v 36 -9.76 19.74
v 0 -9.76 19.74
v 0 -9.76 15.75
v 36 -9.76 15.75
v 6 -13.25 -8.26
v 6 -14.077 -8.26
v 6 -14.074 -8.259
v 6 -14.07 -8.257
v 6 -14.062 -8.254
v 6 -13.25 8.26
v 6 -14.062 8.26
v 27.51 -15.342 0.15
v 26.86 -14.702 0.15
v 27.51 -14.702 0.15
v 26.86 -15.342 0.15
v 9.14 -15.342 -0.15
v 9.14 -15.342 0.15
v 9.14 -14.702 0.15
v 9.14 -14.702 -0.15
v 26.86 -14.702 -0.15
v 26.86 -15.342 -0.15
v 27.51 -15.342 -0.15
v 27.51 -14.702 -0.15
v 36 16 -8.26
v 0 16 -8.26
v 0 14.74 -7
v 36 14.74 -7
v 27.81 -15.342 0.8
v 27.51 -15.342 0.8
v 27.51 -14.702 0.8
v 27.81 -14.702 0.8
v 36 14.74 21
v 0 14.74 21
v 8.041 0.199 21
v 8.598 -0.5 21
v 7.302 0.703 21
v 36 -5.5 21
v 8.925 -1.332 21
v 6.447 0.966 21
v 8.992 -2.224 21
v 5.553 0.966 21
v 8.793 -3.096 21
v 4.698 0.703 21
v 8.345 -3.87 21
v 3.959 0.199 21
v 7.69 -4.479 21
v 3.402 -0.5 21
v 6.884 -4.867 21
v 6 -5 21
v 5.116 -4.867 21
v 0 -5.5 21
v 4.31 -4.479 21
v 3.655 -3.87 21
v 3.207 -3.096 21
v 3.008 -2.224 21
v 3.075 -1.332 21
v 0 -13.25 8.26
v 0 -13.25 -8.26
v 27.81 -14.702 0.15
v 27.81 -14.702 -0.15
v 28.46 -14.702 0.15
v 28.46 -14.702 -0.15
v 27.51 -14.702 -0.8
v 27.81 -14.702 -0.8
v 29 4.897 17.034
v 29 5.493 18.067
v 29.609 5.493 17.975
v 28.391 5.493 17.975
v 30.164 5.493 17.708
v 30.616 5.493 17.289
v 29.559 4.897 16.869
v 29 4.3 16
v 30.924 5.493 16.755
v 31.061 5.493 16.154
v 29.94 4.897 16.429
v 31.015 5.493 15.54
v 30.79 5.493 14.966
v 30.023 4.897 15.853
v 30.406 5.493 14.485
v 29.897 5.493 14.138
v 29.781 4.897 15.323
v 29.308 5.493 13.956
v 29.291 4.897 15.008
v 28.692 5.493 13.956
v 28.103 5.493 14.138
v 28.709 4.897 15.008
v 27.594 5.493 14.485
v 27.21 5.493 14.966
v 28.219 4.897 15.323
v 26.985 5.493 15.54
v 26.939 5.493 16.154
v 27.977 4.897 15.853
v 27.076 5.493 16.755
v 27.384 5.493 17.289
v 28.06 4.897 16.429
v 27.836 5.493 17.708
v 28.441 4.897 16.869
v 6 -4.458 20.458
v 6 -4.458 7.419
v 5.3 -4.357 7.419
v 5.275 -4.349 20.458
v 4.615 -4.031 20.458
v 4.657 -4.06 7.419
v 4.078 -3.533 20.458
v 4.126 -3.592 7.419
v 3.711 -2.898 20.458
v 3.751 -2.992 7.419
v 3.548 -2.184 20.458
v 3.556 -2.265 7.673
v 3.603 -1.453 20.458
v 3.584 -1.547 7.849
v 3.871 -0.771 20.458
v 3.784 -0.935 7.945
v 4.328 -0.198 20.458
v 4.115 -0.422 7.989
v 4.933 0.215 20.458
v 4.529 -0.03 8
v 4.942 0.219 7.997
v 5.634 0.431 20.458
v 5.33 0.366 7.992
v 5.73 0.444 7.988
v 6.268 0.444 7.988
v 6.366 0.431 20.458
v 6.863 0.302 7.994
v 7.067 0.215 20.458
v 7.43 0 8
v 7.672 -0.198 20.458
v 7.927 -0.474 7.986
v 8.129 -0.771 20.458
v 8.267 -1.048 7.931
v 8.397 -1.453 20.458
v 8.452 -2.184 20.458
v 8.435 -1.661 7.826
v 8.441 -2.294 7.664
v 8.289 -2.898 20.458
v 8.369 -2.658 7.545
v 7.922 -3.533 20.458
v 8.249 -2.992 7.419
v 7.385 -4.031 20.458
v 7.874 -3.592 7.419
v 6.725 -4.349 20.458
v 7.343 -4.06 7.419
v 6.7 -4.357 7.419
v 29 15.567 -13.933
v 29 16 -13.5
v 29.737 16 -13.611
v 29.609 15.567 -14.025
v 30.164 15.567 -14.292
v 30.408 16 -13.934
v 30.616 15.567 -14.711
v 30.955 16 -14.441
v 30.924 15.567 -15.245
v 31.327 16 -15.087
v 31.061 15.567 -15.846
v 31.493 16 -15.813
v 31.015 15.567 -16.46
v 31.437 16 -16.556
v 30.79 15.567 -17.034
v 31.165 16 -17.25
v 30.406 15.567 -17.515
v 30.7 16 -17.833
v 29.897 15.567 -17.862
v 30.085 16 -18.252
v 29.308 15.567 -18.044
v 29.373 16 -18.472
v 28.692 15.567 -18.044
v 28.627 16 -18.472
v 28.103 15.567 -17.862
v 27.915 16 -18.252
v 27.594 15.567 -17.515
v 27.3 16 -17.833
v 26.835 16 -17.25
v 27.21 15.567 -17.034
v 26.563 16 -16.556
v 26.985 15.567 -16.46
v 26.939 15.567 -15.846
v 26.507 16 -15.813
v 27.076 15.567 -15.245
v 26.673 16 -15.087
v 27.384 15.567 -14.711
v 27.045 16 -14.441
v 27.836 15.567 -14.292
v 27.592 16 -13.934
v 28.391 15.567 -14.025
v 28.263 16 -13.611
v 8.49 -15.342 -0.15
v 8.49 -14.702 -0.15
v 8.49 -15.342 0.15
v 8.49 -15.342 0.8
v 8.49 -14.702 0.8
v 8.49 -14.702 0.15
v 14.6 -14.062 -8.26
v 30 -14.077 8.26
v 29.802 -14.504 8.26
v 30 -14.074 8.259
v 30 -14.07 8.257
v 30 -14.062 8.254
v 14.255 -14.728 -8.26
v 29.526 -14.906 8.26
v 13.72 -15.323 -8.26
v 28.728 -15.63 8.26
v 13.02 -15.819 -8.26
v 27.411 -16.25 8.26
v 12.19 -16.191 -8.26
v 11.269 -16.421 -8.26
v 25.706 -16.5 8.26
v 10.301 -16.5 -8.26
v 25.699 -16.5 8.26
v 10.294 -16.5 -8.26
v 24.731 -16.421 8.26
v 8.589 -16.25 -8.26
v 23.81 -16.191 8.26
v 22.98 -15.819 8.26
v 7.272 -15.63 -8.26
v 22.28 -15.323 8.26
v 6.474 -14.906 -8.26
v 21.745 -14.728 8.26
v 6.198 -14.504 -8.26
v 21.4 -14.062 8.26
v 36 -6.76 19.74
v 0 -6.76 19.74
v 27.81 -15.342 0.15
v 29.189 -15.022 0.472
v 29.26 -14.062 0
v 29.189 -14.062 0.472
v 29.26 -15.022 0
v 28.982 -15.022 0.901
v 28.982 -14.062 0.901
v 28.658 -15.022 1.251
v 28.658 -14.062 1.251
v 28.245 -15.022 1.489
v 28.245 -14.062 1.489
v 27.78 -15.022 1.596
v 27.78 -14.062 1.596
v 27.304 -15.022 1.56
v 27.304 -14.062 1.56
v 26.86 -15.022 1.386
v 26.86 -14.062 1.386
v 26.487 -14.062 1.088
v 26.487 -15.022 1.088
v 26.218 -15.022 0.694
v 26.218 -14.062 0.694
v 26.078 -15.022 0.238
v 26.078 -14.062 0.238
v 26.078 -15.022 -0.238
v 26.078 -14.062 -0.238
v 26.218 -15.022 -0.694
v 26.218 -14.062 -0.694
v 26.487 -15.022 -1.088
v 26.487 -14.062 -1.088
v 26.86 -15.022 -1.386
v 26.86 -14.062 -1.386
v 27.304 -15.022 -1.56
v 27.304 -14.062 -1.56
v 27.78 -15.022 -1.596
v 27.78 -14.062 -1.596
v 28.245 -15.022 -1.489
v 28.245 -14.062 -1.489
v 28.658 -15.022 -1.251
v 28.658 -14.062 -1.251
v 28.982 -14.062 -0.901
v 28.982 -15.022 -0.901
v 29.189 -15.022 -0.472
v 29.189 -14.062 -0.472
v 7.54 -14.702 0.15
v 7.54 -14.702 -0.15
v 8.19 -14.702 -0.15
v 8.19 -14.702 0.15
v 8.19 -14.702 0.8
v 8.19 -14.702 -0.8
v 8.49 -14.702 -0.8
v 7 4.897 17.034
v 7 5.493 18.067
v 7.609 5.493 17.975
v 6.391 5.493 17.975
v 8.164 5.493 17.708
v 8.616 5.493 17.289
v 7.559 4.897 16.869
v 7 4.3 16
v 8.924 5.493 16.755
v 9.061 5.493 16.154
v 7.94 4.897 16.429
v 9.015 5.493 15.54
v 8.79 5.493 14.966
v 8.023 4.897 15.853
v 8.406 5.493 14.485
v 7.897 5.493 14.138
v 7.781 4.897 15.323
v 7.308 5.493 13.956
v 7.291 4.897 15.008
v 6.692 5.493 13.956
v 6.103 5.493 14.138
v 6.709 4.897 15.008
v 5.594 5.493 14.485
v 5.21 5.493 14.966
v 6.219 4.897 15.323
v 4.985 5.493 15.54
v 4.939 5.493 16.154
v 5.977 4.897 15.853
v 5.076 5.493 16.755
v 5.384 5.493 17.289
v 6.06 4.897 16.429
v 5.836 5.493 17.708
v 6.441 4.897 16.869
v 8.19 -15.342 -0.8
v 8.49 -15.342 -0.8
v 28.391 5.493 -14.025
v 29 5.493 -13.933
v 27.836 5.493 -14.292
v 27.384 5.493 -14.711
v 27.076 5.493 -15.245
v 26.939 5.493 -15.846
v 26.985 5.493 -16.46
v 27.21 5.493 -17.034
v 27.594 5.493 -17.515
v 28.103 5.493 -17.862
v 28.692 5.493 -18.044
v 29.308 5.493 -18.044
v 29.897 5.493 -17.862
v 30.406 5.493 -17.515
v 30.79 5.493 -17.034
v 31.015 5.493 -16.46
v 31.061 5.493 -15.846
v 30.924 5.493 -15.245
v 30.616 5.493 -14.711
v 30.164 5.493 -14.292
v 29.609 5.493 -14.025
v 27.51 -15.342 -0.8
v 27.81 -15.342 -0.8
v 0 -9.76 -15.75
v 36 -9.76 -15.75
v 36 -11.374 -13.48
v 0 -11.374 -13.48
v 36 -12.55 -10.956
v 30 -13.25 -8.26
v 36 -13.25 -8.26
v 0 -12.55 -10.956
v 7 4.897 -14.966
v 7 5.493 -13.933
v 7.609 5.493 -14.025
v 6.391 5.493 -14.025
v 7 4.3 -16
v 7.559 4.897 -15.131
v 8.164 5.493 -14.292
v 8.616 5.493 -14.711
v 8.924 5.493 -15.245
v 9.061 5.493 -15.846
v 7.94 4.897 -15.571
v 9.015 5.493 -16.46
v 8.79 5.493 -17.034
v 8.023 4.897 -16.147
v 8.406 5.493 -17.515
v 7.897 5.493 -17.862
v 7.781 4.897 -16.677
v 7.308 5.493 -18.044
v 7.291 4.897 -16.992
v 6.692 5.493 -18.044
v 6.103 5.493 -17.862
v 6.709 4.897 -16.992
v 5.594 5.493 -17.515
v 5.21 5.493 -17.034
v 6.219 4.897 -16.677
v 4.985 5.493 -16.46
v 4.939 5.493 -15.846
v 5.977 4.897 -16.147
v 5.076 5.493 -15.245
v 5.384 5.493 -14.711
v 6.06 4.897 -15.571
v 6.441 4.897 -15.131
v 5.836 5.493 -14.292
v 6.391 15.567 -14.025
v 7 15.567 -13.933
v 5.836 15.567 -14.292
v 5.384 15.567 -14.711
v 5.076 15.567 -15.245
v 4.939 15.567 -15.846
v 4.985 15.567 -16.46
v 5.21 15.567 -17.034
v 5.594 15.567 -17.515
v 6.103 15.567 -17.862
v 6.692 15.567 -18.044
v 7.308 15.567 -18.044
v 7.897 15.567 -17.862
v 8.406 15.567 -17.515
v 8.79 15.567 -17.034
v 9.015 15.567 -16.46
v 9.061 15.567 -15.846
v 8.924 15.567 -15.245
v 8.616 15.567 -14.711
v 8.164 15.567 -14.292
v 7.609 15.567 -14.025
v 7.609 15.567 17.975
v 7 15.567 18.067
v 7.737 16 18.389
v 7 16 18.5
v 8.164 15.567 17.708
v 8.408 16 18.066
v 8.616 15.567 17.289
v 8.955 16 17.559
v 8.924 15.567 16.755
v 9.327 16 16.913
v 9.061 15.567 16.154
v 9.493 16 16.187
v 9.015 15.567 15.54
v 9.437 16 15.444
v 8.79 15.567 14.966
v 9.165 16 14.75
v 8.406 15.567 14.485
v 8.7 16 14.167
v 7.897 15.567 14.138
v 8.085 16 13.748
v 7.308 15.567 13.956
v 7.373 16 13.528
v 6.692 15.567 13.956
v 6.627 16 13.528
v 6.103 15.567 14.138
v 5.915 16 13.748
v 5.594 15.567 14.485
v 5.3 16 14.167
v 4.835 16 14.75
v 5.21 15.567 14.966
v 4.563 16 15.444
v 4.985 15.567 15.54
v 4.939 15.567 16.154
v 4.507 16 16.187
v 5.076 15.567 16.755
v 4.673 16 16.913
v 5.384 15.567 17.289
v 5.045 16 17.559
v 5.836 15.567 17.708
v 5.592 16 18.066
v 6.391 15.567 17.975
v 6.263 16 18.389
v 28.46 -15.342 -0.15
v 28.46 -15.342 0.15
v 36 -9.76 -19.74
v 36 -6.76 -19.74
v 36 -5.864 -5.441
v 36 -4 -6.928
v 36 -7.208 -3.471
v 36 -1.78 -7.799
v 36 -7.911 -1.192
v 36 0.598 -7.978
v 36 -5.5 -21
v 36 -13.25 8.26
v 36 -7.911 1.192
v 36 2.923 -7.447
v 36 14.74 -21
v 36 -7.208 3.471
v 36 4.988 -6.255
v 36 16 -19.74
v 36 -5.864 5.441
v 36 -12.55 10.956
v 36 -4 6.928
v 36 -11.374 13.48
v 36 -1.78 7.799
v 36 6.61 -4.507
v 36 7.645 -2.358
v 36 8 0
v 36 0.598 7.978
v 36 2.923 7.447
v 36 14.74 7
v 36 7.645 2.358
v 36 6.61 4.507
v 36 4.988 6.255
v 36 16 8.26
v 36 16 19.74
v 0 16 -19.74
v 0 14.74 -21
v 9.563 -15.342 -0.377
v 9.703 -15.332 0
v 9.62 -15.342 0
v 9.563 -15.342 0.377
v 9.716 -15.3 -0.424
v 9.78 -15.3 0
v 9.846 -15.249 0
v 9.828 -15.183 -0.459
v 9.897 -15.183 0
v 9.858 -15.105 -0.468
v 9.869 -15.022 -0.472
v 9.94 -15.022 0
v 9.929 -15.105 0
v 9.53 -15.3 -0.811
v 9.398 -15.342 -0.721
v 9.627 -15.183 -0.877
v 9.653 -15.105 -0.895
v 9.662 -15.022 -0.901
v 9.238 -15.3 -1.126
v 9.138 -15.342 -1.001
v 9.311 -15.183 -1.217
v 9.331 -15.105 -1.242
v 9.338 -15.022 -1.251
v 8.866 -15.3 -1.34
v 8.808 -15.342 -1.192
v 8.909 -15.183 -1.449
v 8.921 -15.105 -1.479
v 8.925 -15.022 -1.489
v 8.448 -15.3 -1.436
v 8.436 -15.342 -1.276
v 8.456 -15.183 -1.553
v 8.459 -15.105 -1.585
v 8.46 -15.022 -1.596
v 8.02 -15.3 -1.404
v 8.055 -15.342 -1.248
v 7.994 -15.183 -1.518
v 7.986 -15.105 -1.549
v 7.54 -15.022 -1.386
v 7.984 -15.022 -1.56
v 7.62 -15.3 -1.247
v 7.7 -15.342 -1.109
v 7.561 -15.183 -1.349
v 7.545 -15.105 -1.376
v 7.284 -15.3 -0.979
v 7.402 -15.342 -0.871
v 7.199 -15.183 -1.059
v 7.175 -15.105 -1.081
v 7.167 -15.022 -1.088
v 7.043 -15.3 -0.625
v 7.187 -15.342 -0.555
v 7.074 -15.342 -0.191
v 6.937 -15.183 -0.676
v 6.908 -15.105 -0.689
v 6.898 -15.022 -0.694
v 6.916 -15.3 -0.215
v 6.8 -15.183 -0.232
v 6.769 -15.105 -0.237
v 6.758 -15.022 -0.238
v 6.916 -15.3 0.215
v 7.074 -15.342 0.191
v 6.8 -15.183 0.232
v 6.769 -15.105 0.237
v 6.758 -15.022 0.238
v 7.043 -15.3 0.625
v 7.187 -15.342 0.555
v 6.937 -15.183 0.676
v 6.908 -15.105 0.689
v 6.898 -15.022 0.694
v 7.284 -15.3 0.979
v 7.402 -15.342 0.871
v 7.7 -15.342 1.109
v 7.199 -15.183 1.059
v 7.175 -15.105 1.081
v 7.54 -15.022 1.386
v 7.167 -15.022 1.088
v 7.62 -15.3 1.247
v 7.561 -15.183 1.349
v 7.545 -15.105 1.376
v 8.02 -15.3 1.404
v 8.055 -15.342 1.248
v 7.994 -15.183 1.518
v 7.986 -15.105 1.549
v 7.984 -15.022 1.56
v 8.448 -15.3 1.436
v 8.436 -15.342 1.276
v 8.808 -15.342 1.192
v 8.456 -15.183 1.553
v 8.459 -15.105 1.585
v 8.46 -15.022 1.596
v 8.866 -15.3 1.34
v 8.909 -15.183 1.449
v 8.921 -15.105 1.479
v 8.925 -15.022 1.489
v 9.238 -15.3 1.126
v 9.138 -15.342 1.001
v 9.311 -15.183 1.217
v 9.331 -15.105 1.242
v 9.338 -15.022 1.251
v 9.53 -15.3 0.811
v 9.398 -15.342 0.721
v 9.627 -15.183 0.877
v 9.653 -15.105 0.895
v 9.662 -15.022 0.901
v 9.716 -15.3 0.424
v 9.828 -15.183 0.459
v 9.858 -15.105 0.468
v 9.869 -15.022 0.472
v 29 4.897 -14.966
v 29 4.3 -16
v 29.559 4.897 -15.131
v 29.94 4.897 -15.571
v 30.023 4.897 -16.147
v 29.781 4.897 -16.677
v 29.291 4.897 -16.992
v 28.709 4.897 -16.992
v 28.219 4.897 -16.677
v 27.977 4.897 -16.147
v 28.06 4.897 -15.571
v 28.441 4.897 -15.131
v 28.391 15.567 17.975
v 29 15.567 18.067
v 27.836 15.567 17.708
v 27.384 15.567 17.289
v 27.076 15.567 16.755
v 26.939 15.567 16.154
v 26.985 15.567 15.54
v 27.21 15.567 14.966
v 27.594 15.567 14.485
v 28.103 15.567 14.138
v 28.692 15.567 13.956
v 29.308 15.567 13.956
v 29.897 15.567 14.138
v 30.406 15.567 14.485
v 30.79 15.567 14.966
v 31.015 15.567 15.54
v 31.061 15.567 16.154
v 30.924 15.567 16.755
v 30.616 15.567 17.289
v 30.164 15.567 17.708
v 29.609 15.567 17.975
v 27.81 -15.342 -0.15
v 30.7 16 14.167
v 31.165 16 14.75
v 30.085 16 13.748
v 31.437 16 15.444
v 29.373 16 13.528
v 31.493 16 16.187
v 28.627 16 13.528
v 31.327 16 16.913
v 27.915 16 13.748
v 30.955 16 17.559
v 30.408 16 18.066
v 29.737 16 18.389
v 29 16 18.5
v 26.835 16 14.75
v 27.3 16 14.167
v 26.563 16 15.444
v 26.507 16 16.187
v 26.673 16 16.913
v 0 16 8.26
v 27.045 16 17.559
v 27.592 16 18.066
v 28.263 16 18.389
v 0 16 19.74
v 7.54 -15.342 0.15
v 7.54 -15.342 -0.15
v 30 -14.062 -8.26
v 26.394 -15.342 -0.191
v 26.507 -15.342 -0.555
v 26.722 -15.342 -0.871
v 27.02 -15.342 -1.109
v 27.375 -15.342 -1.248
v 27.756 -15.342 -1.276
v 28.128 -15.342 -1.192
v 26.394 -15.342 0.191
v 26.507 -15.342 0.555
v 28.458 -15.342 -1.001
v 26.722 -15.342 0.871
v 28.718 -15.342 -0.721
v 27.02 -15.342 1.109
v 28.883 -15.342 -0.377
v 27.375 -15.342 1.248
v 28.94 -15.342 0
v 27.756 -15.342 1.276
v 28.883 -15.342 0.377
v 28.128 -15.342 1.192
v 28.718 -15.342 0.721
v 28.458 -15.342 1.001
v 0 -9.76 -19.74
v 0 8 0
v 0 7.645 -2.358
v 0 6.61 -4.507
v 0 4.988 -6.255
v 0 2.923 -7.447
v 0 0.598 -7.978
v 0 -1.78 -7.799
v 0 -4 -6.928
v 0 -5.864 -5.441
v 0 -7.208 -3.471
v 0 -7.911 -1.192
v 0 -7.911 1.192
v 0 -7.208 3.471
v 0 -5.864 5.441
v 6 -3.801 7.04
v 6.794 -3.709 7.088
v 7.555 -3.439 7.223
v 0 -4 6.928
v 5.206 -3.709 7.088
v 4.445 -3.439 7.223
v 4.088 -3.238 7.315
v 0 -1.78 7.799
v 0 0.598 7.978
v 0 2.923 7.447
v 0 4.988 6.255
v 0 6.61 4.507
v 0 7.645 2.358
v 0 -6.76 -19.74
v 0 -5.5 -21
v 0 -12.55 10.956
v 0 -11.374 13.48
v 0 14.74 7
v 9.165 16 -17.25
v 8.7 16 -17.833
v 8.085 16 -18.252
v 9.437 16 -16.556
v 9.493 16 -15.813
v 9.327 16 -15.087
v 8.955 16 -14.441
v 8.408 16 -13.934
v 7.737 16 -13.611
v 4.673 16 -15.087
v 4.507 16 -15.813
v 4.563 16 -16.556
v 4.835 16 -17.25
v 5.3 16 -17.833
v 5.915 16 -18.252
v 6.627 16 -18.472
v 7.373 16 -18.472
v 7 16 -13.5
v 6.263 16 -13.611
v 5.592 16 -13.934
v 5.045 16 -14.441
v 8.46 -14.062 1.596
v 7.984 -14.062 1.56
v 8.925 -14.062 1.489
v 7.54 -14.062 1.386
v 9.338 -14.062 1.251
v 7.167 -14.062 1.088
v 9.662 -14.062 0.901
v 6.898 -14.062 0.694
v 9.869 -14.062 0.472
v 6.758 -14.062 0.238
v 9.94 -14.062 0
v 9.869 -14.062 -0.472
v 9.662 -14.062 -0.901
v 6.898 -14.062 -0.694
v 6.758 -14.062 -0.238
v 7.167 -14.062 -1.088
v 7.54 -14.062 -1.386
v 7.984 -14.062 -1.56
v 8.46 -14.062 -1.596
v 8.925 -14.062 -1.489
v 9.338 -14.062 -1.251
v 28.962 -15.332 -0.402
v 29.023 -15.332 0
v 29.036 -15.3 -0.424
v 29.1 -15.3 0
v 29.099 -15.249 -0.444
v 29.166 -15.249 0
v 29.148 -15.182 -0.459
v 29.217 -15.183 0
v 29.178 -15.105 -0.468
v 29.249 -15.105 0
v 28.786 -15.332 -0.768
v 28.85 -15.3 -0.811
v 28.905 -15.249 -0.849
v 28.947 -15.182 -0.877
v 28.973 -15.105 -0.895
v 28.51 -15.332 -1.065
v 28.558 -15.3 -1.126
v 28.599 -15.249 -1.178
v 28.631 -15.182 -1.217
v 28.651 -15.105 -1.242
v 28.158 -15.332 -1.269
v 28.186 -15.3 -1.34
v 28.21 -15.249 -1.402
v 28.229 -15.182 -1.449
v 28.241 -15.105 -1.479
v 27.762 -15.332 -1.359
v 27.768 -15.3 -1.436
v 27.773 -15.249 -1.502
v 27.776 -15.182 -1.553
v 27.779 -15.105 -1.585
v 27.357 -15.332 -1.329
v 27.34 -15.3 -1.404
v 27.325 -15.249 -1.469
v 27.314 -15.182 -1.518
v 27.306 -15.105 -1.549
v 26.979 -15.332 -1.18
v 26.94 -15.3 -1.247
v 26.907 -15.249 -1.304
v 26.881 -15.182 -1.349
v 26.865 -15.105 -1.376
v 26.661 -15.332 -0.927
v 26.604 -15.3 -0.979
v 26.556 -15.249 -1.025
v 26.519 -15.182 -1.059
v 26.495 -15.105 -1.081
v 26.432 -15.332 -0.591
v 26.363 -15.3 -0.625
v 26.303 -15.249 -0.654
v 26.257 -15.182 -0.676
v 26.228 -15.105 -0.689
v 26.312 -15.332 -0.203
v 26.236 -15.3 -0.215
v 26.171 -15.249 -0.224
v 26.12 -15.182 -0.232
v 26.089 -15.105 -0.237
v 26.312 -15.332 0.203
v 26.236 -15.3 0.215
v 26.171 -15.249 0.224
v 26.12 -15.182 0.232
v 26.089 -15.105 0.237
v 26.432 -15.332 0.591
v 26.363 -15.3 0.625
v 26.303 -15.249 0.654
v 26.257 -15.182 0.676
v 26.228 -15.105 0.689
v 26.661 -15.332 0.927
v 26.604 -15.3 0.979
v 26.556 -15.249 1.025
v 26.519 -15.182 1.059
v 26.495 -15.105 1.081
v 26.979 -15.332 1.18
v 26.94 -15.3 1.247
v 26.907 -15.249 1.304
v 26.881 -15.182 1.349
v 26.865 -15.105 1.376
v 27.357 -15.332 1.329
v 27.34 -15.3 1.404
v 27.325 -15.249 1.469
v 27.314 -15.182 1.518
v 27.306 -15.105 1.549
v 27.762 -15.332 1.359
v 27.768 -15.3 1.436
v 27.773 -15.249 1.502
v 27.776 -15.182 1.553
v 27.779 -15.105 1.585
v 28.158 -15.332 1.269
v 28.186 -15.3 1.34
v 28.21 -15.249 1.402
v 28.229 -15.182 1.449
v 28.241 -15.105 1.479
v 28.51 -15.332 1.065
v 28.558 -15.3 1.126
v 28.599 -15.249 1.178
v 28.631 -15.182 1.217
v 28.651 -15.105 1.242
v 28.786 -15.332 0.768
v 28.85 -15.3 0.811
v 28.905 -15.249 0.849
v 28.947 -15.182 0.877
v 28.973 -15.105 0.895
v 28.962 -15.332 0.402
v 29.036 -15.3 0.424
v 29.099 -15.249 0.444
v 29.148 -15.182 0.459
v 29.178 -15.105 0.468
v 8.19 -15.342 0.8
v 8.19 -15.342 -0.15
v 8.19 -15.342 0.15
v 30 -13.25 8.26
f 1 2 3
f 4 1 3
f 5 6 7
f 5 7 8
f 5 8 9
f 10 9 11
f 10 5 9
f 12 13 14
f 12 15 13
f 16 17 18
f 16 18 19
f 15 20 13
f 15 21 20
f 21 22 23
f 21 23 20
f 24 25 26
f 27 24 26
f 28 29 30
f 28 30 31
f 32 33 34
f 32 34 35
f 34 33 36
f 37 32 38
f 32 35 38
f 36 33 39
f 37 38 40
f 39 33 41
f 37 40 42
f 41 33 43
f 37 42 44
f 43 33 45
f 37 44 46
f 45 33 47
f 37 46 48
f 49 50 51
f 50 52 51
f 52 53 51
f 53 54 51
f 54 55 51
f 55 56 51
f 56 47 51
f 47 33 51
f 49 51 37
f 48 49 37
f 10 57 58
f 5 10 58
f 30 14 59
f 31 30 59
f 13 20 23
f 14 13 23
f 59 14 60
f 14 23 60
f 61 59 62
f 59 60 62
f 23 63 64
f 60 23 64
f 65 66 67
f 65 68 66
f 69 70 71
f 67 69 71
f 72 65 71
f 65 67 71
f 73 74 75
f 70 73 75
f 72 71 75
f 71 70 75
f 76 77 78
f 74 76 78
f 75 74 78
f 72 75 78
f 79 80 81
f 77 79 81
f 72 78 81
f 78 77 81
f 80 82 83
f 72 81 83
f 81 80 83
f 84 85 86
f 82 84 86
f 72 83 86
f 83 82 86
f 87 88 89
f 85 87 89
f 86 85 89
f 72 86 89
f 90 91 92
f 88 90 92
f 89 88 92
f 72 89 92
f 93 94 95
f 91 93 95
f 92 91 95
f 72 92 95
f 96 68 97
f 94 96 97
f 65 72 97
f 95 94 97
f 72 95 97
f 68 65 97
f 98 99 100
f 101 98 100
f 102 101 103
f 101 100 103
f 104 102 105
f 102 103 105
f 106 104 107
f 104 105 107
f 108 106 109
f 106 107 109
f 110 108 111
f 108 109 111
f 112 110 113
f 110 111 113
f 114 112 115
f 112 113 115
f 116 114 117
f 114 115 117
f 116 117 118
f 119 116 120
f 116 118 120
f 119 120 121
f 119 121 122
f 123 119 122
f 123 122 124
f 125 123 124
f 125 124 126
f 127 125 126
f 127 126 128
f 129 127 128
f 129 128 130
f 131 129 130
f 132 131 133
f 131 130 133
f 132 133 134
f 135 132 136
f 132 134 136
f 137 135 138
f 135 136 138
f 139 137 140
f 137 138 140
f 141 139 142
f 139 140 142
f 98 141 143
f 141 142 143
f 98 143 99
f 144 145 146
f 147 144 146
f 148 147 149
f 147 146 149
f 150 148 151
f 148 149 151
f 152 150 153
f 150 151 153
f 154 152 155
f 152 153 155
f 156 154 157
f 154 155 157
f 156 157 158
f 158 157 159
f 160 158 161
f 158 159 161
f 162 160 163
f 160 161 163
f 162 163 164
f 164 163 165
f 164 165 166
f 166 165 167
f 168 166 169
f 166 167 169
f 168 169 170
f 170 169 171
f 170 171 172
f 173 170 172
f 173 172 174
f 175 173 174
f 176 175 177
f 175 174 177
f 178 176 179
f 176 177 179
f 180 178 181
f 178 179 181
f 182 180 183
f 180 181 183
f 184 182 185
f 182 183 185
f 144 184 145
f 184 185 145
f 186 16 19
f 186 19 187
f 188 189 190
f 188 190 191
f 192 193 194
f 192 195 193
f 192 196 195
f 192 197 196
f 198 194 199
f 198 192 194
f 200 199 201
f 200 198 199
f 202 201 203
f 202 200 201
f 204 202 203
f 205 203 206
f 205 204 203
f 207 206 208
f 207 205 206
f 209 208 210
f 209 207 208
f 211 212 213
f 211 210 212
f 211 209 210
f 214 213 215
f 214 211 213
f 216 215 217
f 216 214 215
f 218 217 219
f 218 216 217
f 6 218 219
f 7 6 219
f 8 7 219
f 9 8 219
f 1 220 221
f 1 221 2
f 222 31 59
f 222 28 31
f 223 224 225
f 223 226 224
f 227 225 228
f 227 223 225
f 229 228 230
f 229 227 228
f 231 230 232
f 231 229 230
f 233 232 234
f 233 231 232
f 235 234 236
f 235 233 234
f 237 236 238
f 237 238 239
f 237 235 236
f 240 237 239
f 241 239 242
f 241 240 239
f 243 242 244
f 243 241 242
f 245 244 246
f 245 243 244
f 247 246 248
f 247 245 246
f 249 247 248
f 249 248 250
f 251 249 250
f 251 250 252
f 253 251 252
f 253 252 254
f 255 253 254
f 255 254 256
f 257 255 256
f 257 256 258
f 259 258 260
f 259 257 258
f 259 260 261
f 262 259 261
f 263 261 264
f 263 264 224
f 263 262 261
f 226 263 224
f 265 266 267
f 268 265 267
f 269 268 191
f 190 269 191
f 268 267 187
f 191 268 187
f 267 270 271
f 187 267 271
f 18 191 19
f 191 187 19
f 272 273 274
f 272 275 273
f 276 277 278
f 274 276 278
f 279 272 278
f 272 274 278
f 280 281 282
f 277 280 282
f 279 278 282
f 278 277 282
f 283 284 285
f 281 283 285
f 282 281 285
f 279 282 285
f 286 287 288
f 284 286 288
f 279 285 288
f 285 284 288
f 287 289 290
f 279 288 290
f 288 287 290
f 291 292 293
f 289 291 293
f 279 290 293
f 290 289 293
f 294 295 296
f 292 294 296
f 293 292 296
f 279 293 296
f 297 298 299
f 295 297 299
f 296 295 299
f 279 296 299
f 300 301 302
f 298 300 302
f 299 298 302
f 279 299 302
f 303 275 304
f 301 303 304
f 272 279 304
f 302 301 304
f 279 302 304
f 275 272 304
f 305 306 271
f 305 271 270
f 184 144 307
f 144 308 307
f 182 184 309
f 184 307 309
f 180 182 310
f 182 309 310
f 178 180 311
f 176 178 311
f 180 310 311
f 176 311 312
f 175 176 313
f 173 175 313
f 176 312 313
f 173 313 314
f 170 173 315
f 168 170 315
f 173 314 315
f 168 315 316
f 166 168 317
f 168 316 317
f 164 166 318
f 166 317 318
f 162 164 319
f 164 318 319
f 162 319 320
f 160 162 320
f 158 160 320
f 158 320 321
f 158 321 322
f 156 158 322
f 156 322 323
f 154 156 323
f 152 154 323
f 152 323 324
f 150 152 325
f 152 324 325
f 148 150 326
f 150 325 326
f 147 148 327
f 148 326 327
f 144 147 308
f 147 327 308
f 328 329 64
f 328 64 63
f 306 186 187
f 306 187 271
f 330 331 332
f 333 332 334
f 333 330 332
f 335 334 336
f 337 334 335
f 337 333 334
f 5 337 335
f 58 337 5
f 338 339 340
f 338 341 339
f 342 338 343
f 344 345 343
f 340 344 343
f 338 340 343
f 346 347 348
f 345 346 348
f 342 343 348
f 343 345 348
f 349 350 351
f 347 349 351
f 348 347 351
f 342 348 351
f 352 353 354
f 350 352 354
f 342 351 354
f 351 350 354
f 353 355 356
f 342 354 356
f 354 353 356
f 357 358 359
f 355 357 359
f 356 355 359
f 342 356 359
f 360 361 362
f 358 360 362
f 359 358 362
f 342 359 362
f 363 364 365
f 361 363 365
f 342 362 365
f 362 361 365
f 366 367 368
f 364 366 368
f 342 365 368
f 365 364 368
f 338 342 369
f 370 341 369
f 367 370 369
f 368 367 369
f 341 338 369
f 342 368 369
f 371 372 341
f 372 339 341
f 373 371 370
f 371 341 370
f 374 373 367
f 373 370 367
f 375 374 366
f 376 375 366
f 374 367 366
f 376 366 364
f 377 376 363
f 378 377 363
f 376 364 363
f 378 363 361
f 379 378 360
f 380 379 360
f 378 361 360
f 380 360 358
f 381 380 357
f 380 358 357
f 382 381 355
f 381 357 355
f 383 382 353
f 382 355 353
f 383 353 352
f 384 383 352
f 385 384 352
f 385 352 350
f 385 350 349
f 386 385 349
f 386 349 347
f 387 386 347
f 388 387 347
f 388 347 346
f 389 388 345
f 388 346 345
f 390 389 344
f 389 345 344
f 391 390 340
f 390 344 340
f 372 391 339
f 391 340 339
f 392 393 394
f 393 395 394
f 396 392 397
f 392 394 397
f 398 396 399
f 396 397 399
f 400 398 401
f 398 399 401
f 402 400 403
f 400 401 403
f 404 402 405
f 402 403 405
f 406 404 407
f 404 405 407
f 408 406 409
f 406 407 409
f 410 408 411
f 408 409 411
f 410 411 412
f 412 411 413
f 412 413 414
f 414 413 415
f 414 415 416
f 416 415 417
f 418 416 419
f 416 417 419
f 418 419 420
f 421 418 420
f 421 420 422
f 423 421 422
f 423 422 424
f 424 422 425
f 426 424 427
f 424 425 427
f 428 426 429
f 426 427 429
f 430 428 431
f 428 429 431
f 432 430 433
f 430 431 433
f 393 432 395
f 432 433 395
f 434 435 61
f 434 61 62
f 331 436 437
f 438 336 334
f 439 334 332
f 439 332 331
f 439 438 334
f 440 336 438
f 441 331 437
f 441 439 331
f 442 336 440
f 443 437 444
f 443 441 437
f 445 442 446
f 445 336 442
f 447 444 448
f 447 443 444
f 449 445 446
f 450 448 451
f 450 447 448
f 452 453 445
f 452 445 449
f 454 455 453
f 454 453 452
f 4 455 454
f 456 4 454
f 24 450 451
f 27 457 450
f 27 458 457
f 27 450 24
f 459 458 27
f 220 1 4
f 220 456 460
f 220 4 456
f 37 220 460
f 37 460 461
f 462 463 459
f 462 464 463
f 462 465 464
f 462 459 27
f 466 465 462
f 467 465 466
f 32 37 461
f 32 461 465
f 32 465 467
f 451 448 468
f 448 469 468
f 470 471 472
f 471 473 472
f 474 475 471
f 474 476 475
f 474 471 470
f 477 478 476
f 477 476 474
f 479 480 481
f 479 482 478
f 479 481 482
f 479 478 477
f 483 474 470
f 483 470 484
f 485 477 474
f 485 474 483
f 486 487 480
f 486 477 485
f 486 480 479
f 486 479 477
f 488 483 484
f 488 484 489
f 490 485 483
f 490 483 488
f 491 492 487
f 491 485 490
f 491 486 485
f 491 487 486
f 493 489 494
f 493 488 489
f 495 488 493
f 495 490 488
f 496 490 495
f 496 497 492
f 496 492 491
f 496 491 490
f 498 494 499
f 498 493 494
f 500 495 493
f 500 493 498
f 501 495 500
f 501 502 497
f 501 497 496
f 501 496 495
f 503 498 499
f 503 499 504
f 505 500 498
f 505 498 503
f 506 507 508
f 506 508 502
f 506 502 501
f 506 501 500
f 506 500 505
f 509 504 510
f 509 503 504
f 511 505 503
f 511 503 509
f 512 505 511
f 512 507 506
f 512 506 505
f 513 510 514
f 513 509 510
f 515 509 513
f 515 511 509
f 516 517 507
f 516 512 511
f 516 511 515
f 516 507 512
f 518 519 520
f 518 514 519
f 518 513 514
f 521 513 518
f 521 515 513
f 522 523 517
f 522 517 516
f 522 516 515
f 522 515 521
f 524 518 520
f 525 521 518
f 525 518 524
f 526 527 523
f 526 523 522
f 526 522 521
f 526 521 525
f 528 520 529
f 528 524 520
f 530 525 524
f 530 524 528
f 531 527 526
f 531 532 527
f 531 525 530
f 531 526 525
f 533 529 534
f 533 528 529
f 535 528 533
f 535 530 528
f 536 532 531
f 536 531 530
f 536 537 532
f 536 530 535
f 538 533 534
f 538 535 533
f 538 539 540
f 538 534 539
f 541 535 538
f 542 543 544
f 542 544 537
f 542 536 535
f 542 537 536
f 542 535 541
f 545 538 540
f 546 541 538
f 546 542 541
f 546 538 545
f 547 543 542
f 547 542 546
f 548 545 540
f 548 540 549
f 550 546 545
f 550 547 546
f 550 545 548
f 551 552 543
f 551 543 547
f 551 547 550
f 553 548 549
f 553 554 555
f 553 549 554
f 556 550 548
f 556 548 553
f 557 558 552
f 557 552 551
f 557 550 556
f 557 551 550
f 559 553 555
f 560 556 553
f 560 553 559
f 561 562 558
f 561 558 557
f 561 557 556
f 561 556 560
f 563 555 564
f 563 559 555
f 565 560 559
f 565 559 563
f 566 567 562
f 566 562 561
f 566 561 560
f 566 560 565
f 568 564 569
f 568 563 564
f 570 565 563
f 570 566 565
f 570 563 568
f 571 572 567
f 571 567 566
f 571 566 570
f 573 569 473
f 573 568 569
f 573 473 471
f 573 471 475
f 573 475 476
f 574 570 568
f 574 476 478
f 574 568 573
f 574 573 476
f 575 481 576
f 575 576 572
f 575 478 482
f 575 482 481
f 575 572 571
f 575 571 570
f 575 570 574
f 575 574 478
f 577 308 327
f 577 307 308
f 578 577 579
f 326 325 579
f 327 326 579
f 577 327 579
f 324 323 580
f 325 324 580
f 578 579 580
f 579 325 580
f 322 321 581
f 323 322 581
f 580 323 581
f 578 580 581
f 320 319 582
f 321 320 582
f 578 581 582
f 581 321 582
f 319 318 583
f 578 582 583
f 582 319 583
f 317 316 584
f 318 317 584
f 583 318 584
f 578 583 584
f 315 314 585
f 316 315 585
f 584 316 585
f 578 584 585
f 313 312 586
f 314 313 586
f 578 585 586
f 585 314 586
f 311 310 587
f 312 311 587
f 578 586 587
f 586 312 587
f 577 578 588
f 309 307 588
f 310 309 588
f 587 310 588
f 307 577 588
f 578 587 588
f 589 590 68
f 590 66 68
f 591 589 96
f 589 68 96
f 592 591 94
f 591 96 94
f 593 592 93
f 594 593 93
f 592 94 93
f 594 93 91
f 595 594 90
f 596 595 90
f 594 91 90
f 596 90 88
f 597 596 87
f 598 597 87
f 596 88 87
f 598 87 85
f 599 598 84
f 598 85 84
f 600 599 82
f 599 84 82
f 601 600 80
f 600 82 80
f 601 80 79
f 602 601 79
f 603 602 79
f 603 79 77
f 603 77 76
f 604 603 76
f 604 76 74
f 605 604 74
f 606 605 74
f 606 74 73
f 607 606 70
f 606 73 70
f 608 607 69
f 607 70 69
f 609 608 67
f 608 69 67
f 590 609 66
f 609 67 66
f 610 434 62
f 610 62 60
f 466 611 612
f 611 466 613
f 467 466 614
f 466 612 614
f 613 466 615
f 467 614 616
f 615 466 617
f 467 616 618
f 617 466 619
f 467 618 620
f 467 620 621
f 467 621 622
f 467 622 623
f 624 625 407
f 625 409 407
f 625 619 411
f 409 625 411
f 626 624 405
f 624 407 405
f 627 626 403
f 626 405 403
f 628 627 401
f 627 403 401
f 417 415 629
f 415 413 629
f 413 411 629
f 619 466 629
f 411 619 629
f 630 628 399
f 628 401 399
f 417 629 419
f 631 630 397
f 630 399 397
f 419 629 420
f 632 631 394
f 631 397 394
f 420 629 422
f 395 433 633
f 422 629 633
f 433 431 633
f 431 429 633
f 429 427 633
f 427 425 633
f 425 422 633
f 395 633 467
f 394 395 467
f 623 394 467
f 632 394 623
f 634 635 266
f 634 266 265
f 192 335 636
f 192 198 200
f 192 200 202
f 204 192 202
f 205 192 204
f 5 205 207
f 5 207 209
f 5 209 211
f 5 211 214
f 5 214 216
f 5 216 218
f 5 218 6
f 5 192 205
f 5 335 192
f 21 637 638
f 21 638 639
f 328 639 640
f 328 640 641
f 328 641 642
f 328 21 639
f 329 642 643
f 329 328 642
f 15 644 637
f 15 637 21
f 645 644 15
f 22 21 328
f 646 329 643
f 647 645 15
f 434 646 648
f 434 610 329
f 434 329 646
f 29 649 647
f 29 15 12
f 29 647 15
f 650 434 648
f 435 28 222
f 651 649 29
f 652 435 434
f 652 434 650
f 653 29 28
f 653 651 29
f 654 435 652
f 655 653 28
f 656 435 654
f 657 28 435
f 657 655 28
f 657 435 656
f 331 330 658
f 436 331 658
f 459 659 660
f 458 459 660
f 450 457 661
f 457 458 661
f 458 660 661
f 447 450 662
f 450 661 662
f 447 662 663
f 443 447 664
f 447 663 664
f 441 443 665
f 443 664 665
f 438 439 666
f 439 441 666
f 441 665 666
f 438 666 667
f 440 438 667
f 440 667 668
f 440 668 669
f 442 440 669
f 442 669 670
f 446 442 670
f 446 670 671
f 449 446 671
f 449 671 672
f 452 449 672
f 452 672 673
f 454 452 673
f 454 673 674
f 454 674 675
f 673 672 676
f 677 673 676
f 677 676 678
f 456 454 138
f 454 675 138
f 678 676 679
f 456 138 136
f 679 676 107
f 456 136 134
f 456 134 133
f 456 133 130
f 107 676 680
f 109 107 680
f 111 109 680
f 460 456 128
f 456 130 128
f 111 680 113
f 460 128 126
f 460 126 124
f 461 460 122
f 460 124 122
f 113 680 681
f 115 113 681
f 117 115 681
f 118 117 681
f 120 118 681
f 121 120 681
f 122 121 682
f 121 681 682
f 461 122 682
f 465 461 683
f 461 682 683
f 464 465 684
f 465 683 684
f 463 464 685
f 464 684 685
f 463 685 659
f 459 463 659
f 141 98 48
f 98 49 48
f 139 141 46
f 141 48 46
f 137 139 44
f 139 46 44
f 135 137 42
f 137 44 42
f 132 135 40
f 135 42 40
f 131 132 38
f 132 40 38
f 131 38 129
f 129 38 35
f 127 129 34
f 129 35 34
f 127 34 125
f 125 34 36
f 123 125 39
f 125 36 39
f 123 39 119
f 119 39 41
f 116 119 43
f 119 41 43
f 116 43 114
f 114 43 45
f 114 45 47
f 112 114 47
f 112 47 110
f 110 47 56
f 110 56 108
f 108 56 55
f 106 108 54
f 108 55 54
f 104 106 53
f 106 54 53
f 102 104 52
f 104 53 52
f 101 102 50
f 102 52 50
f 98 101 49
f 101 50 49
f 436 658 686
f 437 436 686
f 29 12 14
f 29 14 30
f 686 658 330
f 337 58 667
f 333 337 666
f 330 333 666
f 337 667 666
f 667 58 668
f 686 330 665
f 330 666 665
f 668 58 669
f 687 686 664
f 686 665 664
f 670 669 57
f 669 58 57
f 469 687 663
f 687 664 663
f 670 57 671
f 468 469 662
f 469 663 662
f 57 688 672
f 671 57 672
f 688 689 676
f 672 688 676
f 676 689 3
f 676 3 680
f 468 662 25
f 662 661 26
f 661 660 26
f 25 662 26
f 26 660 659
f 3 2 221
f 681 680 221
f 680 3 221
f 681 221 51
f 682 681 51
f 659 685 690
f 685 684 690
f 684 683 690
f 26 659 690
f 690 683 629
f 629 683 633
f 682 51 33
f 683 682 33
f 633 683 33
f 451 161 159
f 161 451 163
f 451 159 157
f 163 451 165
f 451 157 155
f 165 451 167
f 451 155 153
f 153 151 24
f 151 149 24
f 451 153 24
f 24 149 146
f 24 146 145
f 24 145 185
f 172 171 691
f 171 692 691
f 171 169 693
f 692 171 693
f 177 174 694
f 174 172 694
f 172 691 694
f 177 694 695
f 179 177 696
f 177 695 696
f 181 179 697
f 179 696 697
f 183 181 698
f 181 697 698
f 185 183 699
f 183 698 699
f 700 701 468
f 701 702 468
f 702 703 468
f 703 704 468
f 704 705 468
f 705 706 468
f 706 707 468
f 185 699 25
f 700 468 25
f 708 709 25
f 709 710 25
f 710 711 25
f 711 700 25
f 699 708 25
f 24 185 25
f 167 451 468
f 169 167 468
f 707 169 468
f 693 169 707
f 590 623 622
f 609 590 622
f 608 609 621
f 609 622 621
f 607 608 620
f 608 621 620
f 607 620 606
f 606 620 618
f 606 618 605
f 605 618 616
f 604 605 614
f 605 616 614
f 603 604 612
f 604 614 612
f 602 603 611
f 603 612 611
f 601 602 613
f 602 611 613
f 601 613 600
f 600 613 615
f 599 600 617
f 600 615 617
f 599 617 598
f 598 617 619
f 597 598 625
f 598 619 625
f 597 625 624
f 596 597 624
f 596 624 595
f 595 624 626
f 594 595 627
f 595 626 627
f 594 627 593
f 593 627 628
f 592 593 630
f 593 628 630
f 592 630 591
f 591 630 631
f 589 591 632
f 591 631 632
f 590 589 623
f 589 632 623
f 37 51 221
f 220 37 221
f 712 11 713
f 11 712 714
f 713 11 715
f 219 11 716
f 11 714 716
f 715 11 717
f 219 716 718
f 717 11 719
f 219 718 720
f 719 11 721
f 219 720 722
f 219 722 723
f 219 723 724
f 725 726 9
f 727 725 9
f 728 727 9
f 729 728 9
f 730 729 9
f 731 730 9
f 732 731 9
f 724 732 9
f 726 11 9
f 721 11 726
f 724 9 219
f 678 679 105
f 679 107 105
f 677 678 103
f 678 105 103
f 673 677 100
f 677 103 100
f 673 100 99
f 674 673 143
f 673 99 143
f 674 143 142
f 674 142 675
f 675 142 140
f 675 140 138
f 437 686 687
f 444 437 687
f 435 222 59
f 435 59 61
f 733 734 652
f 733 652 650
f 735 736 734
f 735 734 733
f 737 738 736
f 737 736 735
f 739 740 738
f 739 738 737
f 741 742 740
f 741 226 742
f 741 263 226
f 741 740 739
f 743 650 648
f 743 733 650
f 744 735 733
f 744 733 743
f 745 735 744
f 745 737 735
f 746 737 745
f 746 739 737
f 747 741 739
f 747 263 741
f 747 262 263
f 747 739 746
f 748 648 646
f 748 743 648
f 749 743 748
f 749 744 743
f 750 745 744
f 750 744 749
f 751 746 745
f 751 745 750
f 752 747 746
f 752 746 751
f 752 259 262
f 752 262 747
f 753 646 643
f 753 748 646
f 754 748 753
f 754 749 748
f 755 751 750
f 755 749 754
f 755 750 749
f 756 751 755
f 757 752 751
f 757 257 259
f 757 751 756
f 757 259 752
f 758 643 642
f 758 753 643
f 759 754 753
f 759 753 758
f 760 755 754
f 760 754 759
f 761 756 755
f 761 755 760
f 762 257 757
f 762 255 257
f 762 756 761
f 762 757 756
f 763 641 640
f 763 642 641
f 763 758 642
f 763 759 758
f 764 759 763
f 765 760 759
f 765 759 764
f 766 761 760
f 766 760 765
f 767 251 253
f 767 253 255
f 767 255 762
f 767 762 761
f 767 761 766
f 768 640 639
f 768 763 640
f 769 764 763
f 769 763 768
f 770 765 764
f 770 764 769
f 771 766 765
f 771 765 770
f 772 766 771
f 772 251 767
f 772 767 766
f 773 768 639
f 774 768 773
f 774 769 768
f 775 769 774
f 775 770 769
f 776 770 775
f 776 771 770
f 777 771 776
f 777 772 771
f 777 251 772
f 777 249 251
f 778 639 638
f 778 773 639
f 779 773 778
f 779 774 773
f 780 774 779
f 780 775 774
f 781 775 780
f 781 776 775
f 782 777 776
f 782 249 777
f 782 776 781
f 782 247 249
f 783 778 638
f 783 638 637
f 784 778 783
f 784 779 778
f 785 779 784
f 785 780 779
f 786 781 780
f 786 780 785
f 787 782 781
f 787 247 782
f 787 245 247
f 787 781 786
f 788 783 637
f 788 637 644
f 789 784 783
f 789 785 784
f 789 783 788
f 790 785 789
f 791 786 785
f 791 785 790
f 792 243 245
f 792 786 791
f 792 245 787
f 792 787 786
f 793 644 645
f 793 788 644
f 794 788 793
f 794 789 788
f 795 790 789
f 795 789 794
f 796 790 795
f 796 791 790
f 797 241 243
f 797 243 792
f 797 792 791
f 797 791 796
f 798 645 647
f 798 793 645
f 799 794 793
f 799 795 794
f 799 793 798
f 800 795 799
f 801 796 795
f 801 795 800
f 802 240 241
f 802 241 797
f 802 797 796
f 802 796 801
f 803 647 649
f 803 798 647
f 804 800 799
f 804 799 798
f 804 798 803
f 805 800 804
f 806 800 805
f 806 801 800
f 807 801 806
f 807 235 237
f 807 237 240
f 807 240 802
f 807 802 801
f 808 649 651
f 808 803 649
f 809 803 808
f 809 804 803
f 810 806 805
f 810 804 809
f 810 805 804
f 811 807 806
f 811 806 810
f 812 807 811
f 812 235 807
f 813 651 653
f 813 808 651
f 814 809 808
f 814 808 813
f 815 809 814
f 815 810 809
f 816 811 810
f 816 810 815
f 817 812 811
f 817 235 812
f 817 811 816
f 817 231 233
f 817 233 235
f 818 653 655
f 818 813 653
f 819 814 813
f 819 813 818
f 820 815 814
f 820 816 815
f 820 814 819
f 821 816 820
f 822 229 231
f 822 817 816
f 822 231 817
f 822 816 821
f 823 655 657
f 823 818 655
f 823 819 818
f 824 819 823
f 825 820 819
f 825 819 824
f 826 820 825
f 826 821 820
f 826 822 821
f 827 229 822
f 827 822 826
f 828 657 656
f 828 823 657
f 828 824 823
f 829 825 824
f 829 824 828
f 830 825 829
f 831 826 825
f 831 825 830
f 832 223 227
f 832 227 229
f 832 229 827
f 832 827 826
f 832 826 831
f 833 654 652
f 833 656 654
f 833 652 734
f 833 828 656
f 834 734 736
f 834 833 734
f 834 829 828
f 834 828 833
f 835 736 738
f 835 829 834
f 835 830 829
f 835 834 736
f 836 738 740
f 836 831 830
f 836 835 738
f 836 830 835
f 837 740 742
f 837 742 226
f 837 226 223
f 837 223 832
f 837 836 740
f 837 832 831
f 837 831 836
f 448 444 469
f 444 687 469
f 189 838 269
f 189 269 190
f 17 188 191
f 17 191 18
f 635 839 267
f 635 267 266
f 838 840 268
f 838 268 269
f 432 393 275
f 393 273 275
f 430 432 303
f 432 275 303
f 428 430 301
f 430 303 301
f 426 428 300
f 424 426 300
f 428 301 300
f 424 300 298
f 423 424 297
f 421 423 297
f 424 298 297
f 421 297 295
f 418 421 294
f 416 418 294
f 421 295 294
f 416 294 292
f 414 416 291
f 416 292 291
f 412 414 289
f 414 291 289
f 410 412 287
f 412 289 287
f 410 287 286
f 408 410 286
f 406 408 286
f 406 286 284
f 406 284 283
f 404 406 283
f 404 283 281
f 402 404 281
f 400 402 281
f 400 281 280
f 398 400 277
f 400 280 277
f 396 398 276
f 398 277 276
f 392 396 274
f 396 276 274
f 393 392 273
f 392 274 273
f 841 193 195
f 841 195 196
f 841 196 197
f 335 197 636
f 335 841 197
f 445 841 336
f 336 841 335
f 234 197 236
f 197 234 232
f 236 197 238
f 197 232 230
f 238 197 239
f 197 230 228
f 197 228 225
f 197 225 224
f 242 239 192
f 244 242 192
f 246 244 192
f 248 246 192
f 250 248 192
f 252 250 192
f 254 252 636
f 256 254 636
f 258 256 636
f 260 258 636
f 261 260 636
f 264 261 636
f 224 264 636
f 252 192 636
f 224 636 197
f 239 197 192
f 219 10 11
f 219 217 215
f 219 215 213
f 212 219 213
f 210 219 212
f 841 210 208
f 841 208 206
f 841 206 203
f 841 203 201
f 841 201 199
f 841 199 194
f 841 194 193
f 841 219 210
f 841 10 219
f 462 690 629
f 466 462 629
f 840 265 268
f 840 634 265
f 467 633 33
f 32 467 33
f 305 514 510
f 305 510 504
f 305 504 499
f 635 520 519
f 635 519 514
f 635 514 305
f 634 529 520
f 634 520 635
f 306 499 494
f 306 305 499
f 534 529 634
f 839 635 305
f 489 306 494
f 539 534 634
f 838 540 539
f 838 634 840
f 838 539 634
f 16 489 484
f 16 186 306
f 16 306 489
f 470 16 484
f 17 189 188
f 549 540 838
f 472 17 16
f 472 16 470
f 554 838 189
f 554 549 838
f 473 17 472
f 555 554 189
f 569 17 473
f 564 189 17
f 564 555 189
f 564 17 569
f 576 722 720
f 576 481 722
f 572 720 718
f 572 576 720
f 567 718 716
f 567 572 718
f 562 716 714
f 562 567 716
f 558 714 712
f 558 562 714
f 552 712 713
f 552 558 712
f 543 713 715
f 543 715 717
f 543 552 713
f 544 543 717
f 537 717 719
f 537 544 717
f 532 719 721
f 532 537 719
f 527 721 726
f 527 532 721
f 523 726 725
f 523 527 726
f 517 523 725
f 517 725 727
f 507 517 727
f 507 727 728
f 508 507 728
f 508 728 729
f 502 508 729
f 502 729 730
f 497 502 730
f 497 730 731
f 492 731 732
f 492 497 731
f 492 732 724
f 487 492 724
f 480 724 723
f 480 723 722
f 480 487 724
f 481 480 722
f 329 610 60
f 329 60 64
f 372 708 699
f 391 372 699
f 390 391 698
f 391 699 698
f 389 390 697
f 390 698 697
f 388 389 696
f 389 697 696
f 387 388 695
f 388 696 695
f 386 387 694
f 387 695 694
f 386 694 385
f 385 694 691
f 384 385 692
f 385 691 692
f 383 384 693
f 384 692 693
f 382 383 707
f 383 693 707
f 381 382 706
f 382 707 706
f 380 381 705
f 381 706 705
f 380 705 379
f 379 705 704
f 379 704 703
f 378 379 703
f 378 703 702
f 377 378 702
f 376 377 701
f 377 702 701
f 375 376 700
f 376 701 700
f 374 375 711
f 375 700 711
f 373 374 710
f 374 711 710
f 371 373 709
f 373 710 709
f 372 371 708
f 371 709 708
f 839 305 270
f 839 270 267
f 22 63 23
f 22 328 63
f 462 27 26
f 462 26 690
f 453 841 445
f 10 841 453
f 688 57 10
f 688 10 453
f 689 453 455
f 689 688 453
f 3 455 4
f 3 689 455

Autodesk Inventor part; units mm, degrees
sketch "Sketch_1" plane through (0, 0, 0) normal (1, 0, 0) x (0, 1, 0)
  line L0 (14.74, 21) -> (-5.5, 21)
  line L1 (-5.5, 21) -> (-6.76, 19.74)
  line L2 (-6.76, 19.74) -> (-9.76, 19.74)
  line L3 (-9.76, 19.74) -> (-9.76, 15.75)
  arc A0 (-9.76, 15.75) -> (-13.25, 8.26) centre (1.867, 5.7743) ccw
  line L4 (-13.25, 8.26) -> (-13.25, -8.26)
  arc A1 (-13.25, -8.26) -> (-9.76, -15.75) centre (1.867, -5.7743) ccw
  line L5 (-9.76, -15.75) -> (-9.76, -19.74)
  line L6 (-9.76, -19.74) -> (-6.76, -19.74)
  line L7 (-6.76, -19.74) -> (-5.5, -21)
  line L8 (-5.5, -21) -> (14.74, -21)
  line L9 (14.74, -21) -> (16, -19.74)
  line L10 (16, -19.74) -> (16, -8.26)
  line L11 (16, -8.26) -> (14.74, -7)
  line L12 (14.74, -7) -> (14.74, 7)
  line L13 (14.74, 7) -> (16, 8.26)
  line L14 (16, 8.26) -> (16, 19.74)
  line L15 (16, 19.74) -> (14.74, 21)
  circle A2 centre (0, 0) radius 8
extrude "Extrusion1" add sketch "Sketch_1" along normal blind 36
sketch "Sketch_2" plane through (18, 0, 0) normal (0.682, 0, 0.7314) x (0.7314, 0, -0.682)
  line L0 (-18, -14.0625) -> (-3.1468, -14.0625)
  arc A0 (-3.1468, -14.0625) -> (3.1468, -14.0625) centre (0, -13.25) ccw
  line L1 (3.1468, -14.0625) -> (18, -14.0625)
  line L2 (18, -14.0625) -> (18, -13.25)
  line L3 (18, -13.25) -> (-18, -13.25)
  line L4 (-18, -13.25) -> (-18, -14.0625)
extrude "Extrusion2" add sketch "Sketch_2" along normal mid plane 36
sketch "Sketch_3" plane through (0, -13.25, 0) normal (0, 1, 0) x (1, 0, 0)
  line L0 (-18, -36) -> (54, -36)
  line L1 (54, -36) -> (54, 36)
  line L2 (54, 36) -> (-18, 36)
  line L3 (-18, 36) -> (-18, -36)
  line L4 (6, -8.26) -> (30, -8.26)
  line L5 (30, -8.26) -> (30, 8.26)
  line L6 (30, 8.26) -> (6, 8.26)
  line L7 (6, 8.26) -> (6, -8.26)
extrude "Extrusion3" cut sketch "Sketch_3" against normal blind 3.25
sketch "Sketch_4" plane through (0, 0, 0) normal (0, 0, 1) x (1, 0, 0)
  line L0 (8.34, -15.3425) -> (8.34, -14.0625)
  line L1 (8.34, -14.0625) -> (9.94, -14.0625)
  line L2 (9.94, -14.0625) -> (9.94, -15.0225)
  arc A0 (9.62, -15.3425) -> (9.94, -15.0225) centre (9.62, -15.0225) ccw
  line L3 (9.62, -15.3425) -> (8.34, -15.3425)
  line L4 (8.34, -15.3425) -> (8.34, -14.0625)
revolve "Revolution1" add sketch "Sketch_4" angle 360 about axis through (8.34, -15.3425, 0) along (0, -1, 0)
sketch "Sketch_5" plane through (0, 0, 0) normal (0, 0, 1) x (1, 0, 0)
  line L0 (27.66, -15.3425) -> (27.66, -14.0625)
  line L1 (27.66, -14.0625) -> (29.26, -14.0625)
  line L2 (29.26, -14.0625) -> (29.26, -15.0225)
  arc A0 (28.94, -15.3425) -> (29.26, -15.0225) centre (28.94, -15.0225) ccw
  line L3 (28.94, -15.3425) -> (27.66, -15.3425)
  line L4 (27.66, -15.3425) -> (27.66, -14.0625)
revolve "Revolution2" add sketch "Sketch_5" angle 360 about axis through (27.66, -15.3425, 0) along (0, -1, 0)
sketch "Sketch_6" plane through (0, -15.3425, 0) normal (0, 1, 0) x (1, 0, 0)
  line L0 (26.86, 0.15) -> (26.86, -0.15)
  line L1 (26.86, -0.15) -> (27.51, -0.15)
  line L2 (27.51, -0.15) -> (27.51, -0.8)
  line L3 (27.51, -0.8) -> (27.81, -0.8)
  line L4 (27.81, -0.8) -> (27.81, -0.15)
  line L5 (27.81, -0.15) -> (28.46, -0.15)
  line L6 (28.46, -0.15) -> (28.46, 0.15)
  line L7 (28.46, 0.15) -> (27.81, 0.15)
  line L8 (27.81, 0.15) -> (27.81, 0.8)
  line L9 (27.81, 0.8) -> (27.51, 0.8)
  line L10 (27.51, 0.8) -> (27.51, 0.15)
  line L11 (27.51, 0.15) -> (26.86, 0.15)
extrude "Extrusion4" cut sketch "Sketch_6" along normal blind 0.64
sketch "Sketch_7" plane through (0, -15.3425, 0) normal (0, 1, 0) x (1, 0, 0)
  line L0 (7.54, 0.15) -> (7.54, -0.15)
  line L1 (7.54, -0.15) -> (8.19, -0.15)
  line L2 (8.19, -0.15) -> (8.19, -0.8)
  line L3 (8.19, -0.8) -> (8.49, -0.8)
  line L4 (8.49, -0.8) -> (8.49, -0.15)
  line L5 (8.49, -0.15) -> (9.14, -0.15)
  line L6 (9.14, -0.15) -> (9.14, 0.15)
  line L7 (9.14, 0.15) -> (8.49, 0.15)
  line L8 (8.49, 0.15) -> (8.49, 0.8)
  line L9 (8.49, 0.8) -> (8.19, 0.8)
  line L10 (8.19, 0.8) -> (8.19, 0.15)
  line L11 (8.19, 0.15) -> (7.54, 0.15)
extrude "Extrusion5" cut sketch "Sketch_7" along normal blind 0.64
sketch "Sketch8" plane through (0, -5.5, 21) normal (0, 0, 1) x (1, 0, 0)
  point P0 (6, 3.5)
hole "Hole1" at (6, -2, 21) direction (0, 0, -1) diameter 4.917 depth 13.5806 tip angle 120 countersink diameter 6 countersink angle 90 thread size "M6x1" class "6H" standard "ISO Metric profile"
sketch "Sketch9" plane through (0, 16, -8.26) normal (0, 1, 0) x (1, 0, 0)
  point P0 (7, 7.74)
hole "Hole2" at (7, 16, -16) direction (0, -1, 0) diameter 4.134 depth 10.5066 tip angle 120 countersink diameter 5 countersink angle 90 thread size "M5x0.8" class "6H" standard "ISO Metric profile"
pattern_linear "Rectangular Pattern1" count 2 spacing 22 along (1, 0, 0) count 2 spacing 32 along (0, 0, 1) of "Hole2"
ref_plane "bnt_nut_1_XY" through (0, 0, 0) normal (1, 0, 0) x (0, 0, -1)
ref_plane "bnt_nut_1_YZ" through (0, 0, 0) normal (0, 0, -1) x (0, 1, 0)
ref_plane "bnt_nut_1_ZX" through (0, 0, 0) normal (0, 1, 0) x (1, 0, 0)
thread "Thread1" size "M16x2" class "6H" standard "ISO Metric profile" full length
properties part number "BNT 1605-2.6 Nut"
